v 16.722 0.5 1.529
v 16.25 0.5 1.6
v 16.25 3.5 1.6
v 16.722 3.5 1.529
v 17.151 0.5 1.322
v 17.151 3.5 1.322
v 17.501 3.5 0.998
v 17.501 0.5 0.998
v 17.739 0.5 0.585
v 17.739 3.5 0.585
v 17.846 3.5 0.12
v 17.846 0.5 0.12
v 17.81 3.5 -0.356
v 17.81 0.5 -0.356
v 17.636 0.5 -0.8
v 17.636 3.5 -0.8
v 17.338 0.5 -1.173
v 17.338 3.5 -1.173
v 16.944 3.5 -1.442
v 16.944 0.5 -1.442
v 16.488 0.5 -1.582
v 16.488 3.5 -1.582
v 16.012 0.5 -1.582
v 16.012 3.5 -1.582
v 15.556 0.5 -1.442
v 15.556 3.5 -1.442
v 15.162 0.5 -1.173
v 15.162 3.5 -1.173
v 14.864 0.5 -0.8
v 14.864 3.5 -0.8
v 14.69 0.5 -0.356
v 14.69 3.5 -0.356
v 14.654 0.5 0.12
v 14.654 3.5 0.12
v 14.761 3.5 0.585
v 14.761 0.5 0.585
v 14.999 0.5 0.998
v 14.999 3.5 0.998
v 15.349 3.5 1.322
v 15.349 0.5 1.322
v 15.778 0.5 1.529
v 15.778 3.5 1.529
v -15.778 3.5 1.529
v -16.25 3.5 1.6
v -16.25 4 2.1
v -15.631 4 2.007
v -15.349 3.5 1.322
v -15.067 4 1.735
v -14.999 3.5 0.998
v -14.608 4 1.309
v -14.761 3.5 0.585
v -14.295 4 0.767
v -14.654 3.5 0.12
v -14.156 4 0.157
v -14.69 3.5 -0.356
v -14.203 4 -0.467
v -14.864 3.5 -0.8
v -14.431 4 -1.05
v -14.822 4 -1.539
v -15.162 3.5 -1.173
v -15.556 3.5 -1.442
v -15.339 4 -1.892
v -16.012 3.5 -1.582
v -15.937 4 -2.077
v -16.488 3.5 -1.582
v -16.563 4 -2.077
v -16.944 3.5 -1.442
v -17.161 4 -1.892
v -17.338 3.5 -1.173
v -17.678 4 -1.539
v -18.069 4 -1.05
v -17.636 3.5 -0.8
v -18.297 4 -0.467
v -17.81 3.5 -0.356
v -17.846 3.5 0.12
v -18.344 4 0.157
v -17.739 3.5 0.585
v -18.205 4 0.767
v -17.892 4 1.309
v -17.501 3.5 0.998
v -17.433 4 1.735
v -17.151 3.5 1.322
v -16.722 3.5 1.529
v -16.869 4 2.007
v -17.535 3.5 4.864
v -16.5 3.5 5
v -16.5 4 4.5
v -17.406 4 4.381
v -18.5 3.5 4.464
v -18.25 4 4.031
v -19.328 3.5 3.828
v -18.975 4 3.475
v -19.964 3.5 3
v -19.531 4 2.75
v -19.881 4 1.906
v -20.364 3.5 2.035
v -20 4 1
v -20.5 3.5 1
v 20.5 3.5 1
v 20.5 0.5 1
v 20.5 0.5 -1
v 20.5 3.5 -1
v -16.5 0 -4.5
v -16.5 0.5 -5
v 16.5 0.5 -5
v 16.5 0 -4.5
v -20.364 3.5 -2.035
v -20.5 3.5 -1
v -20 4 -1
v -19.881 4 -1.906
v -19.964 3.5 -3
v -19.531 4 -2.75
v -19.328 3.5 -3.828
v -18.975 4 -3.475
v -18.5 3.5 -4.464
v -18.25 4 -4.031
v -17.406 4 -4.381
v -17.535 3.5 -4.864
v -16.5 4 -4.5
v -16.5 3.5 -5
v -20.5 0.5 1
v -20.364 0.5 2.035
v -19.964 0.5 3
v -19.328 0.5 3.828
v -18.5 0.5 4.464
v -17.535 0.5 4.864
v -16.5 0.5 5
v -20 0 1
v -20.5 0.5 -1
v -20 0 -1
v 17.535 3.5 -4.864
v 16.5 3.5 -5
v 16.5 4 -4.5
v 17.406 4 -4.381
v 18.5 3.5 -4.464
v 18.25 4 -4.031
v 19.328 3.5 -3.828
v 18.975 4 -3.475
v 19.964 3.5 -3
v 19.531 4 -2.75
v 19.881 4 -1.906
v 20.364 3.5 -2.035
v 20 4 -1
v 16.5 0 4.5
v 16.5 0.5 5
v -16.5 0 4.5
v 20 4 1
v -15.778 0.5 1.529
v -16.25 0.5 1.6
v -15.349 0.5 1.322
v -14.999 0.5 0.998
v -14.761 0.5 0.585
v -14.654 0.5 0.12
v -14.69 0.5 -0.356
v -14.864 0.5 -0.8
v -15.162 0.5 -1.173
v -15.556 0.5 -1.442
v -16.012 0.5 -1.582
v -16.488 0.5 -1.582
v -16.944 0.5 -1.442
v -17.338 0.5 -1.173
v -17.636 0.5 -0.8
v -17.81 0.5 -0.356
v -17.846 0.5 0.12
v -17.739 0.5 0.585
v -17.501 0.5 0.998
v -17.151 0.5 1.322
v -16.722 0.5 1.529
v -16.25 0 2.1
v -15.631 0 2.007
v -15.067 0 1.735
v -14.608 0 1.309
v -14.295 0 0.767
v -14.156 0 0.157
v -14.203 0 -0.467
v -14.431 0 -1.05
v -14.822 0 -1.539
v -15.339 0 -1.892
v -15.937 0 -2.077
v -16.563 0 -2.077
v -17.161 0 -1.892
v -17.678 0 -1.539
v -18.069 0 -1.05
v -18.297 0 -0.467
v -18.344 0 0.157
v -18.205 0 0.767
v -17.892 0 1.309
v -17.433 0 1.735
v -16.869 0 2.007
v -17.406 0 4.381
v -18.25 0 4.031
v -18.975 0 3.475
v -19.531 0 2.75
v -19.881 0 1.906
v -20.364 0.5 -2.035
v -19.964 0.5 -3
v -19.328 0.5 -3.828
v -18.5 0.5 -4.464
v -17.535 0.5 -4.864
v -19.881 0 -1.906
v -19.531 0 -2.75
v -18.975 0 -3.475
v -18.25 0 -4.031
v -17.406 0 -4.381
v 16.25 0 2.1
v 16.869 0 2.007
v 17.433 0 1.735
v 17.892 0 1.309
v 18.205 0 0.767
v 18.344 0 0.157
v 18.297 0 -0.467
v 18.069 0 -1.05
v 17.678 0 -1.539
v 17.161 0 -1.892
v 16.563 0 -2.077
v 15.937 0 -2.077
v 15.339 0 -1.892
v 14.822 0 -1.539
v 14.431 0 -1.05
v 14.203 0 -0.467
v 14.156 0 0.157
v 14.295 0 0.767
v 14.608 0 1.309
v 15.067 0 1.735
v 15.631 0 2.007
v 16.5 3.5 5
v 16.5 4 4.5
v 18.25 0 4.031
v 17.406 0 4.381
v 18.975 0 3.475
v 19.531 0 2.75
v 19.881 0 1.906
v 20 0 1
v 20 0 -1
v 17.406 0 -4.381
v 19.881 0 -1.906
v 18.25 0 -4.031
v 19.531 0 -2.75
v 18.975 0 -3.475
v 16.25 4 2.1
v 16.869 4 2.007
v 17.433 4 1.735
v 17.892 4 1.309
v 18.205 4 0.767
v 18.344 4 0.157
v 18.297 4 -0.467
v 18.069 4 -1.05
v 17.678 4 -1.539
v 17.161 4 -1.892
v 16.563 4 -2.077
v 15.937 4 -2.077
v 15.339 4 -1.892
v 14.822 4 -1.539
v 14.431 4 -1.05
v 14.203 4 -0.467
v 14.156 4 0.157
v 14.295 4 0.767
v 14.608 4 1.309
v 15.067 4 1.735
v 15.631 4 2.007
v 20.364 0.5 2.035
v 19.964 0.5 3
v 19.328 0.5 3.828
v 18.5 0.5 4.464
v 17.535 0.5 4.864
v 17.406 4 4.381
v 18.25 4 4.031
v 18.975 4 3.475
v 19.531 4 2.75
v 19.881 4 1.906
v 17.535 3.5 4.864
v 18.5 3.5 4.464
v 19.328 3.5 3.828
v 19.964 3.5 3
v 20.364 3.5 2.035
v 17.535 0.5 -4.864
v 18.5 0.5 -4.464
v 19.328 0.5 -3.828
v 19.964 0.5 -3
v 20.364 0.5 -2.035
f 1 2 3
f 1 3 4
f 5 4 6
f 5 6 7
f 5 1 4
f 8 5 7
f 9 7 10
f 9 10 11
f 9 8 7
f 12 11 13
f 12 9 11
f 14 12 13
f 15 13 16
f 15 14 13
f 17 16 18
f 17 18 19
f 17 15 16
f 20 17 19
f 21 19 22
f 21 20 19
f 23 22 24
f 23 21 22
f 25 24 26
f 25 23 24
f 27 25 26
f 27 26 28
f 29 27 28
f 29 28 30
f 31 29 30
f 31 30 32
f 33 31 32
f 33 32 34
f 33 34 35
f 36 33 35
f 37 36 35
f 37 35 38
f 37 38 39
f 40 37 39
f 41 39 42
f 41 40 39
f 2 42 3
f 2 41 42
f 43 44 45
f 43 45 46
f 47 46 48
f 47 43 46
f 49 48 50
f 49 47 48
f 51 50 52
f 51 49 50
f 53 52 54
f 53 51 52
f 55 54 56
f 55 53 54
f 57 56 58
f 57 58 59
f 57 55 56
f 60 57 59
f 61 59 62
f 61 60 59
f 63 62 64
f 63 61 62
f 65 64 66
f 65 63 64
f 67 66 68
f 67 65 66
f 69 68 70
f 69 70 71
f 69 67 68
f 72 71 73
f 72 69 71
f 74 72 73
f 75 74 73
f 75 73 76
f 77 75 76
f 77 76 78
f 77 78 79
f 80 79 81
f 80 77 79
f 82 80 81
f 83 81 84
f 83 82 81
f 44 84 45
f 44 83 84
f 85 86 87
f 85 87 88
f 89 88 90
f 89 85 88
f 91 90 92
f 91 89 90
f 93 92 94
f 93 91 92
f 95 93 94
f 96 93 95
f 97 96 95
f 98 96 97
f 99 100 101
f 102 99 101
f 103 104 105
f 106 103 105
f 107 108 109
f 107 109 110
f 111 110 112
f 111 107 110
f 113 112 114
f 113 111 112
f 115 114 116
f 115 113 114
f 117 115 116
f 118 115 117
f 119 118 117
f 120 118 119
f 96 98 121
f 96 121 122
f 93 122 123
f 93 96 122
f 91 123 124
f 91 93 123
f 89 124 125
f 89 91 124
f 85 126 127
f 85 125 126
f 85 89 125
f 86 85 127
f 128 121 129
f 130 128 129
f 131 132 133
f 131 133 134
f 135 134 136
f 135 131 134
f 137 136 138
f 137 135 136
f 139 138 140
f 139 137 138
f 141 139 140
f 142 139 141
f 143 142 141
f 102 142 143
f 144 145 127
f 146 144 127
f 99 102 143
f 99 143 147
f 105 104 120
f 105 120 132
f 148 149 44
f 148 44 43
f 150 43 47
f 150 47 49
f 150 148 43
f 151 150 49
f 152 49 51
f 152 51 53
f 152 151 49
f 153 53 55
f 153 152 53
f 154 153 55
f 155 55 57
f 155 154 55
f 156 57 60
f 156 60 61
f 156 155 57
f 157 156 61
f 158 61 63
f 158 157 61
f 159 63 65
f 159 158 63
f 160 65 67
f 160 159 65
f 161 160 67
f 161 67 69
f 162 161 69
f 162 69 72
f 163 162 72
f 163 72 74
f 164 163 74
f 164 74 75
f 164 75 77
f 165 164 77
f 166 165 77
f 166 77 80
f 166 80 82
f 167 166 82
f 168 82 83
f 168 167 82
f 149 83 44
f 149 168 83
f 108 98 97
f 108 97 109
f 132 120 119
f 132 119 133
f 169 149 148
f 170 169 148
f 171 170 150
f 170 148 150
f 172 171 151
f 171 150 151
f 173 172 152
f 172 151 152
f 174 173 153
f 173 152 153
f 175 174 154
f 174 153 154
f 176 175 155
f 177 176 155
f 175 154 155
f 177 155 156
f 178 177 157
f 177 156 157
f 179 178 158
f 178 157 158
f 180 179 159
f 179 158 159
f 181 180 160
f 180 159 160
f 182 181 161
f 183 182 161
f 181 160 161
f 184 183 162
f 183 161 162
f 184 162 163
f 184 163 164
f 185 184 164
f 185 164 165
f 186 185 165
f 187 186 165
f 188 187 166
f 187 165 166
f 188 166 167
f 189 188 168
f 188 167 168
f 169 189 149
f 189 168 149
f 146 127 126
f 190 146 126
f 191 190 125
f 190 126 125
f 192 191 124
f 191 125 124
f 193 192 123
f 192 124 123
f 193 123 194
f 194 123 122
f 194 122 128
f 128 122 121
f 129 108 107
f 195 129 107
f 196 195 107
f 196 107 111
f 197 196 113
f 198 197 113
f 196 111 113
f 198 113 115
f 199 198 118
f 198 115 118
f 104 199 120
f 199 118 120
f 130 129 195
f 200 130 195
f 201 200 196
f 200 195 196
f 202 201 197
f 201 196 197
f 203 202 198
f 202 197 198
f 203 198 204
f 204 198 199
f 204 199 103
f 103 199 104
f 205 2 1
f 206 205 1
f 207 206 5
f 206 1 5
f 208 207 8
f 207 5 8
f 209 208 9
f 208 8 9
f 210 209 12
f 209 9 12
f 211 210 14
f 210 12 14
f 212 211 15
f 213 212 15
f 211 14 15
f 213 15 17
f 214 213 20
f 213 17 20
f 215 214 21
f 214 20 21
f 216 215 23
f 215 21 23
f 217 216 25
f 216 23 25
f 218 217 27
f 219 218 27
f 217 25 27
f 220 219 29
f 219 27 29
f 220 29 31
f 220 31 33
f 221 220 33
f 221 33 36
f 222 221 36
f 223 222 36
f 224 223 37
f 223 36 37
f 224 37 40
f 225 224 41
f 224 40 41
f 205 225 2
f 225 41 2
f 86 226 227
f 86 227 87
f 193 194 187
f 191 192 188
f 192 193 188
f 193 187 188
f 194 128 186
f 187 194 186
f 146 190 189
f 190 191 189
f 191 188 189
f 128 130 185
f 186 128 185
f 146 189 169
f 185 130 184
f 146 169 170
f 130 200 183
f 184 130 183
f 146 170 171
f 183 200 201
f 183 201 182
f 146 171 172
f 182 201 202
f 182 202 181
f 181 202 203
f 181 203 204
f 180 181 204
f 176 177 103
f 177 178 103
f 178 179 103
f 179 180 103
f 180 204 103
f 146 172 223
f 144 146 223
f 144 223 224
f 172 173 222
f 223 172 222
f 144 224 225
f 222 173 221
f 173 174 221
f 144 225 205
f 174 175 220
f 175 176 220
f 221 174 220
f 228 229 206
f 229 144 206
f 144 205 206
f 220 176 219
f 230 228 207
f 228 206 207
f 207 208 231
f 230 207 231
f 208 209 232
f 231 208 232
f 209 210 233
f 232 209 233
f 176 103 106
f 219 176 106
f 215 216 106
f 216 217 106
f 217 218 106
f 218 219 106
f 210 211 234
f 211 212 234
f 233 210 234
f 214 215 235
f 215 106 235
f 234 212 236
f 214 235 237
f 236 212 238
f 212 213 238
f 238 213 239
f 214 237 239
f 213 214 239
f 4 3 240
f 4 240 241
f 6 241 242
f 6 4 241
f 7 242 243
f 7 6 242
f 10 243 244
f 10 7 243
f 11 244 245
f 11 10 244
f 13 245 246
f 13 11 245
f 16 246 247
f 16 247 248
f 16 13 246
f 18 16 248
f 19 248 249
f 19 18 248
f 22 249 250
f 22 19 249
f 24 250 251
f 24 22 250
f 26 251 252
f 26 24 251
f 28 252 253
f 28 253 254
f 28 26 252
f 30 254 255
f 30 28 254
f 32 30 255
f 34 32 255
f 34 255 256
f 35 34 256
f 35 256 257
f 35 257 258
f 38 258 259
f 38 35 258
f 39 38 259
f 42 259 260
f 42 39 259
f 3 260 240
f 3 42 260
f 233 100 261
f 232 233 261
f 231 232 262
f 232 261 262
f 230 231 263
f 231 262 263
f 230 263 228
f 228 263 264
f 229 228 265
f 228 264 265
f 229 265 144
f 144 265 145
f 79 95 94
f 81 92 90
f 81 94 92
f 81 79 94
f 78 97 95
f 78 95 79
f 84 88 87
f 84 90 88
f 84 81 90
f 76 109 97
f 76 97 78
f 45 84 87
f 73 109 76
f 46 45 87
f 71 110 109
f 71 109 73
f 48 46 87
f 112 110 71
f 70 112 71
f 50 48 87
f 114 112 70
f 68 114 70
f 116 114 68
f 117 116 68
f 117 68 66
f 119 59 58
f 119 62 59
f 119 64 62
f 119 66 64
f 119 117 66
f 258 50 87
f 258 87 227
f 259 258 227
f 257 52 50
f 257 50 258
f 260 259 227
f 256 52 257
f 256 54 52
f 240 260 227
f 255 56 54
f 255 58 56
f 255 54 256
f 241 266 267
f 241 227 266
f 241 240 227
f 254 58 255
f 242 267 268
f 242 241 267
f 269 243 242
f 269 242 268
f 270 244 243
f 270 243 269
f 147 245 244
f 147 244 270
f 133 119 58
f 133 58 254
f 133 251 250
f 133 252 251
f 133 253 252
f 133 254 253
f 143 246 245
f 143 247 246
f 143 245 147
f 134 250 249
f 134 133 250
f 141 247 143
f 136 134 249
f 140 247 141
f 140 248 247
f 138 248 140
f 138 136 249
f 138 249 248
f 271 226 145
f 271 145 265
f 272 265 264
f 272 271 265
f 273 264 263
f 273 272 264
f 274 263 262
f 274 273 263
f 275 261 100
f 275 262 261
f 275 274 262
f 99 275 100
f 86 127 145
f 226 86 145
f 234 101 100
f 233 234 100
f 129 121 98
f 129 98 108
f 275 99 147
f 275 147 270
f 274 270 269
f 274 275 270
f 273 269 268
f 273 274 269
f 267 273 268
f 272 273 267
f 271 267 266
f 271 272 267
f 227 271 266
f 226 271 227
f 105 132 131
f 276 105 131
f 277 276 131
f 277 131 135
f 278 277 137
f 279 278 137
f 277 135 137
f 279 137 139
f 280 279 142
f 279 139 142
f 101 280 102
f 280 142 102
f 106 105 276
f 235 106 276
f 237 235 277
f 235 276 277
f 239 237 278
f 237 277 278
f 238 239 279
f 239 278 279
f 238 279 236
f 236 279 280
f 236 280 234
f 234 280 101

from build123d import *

# Parameters (mm, degrees)
SKETCH1_W           = 41
SKETCH1_H           = 10
SKETCH1_R           = 1.6
BOSS_EXTRUDE1_DEPTH = 4
FILLET1_R           = 4
CHAMFER1_SIZE       = 0.5


with BuildPart() as part:
    # Sketch1 → Boss-Extrude1 (new body)
    with BuildSketch(Plane(origin=(0, 0, 0), x_dir=(1, 0, 0), z_dir=(0, 1, 0))):
        Rectangle(SKETCH1_W, SKETCH1_H)
        with Locations(Location((-16.25, 0, 0), (0, 0, 270))):
            Circle(SKETCH1_R, mode=Mode.SUBTRACT)
        with Locations(Location((16.25, 0, 0), (0, 0, 270))):
            Circle(SKETCH1_R, mode=Mode.SUBTRACT)
    extrude(amount=BOSS_EXTRUDE1_DEPTH)

    # Fillet1
    fillet1_edges = [part.edges().sort_by_distance(p)[0] for p in [
        (20.5, 2, 5),
        (-20.5, 2, 5),
        (-20.5, 2, -5),
        (20.5, 2, -5),
    ]]
    fillet(fillet1_edges, radius=FILLET1_R)

    # Chamfer1
    chamfer1_edges = [part.edges().sort_by_distance(p)[0] for p in [
        (-16.25, 0, -1.6),
        (-16.25, 4, -1.6),
        (16.25, 0, -1.6),
        (16.25, 4, -1.6),
        (0, 0, -5),
        (0, 4, -5),
        (20.5, 0, 0),
        (0, 0, 5),
        (-20.5, 0, 0),
        (-19.328427125, 0, -3.828427125),
        (-19.328427125, 0, 3.828427125),
        (19.328427125, 0, 3.828427125),
        (19.328427125, 0, -3.828427125),
        (20.5, 4, 0),
        (-20.5, 4, 0),
        (0, 4, 5),
        (-19.328427125, 4, -3.828427125),
        (-19.328427125, 4, 3.828427125),
        (19.328427125, 4, 3.828427125),
        (19.328427125, 4, -3.828427125),
    ]]
    chamfer(chamfer1_edges, length=CHAMFER1_SIZE)


solid = part.part
